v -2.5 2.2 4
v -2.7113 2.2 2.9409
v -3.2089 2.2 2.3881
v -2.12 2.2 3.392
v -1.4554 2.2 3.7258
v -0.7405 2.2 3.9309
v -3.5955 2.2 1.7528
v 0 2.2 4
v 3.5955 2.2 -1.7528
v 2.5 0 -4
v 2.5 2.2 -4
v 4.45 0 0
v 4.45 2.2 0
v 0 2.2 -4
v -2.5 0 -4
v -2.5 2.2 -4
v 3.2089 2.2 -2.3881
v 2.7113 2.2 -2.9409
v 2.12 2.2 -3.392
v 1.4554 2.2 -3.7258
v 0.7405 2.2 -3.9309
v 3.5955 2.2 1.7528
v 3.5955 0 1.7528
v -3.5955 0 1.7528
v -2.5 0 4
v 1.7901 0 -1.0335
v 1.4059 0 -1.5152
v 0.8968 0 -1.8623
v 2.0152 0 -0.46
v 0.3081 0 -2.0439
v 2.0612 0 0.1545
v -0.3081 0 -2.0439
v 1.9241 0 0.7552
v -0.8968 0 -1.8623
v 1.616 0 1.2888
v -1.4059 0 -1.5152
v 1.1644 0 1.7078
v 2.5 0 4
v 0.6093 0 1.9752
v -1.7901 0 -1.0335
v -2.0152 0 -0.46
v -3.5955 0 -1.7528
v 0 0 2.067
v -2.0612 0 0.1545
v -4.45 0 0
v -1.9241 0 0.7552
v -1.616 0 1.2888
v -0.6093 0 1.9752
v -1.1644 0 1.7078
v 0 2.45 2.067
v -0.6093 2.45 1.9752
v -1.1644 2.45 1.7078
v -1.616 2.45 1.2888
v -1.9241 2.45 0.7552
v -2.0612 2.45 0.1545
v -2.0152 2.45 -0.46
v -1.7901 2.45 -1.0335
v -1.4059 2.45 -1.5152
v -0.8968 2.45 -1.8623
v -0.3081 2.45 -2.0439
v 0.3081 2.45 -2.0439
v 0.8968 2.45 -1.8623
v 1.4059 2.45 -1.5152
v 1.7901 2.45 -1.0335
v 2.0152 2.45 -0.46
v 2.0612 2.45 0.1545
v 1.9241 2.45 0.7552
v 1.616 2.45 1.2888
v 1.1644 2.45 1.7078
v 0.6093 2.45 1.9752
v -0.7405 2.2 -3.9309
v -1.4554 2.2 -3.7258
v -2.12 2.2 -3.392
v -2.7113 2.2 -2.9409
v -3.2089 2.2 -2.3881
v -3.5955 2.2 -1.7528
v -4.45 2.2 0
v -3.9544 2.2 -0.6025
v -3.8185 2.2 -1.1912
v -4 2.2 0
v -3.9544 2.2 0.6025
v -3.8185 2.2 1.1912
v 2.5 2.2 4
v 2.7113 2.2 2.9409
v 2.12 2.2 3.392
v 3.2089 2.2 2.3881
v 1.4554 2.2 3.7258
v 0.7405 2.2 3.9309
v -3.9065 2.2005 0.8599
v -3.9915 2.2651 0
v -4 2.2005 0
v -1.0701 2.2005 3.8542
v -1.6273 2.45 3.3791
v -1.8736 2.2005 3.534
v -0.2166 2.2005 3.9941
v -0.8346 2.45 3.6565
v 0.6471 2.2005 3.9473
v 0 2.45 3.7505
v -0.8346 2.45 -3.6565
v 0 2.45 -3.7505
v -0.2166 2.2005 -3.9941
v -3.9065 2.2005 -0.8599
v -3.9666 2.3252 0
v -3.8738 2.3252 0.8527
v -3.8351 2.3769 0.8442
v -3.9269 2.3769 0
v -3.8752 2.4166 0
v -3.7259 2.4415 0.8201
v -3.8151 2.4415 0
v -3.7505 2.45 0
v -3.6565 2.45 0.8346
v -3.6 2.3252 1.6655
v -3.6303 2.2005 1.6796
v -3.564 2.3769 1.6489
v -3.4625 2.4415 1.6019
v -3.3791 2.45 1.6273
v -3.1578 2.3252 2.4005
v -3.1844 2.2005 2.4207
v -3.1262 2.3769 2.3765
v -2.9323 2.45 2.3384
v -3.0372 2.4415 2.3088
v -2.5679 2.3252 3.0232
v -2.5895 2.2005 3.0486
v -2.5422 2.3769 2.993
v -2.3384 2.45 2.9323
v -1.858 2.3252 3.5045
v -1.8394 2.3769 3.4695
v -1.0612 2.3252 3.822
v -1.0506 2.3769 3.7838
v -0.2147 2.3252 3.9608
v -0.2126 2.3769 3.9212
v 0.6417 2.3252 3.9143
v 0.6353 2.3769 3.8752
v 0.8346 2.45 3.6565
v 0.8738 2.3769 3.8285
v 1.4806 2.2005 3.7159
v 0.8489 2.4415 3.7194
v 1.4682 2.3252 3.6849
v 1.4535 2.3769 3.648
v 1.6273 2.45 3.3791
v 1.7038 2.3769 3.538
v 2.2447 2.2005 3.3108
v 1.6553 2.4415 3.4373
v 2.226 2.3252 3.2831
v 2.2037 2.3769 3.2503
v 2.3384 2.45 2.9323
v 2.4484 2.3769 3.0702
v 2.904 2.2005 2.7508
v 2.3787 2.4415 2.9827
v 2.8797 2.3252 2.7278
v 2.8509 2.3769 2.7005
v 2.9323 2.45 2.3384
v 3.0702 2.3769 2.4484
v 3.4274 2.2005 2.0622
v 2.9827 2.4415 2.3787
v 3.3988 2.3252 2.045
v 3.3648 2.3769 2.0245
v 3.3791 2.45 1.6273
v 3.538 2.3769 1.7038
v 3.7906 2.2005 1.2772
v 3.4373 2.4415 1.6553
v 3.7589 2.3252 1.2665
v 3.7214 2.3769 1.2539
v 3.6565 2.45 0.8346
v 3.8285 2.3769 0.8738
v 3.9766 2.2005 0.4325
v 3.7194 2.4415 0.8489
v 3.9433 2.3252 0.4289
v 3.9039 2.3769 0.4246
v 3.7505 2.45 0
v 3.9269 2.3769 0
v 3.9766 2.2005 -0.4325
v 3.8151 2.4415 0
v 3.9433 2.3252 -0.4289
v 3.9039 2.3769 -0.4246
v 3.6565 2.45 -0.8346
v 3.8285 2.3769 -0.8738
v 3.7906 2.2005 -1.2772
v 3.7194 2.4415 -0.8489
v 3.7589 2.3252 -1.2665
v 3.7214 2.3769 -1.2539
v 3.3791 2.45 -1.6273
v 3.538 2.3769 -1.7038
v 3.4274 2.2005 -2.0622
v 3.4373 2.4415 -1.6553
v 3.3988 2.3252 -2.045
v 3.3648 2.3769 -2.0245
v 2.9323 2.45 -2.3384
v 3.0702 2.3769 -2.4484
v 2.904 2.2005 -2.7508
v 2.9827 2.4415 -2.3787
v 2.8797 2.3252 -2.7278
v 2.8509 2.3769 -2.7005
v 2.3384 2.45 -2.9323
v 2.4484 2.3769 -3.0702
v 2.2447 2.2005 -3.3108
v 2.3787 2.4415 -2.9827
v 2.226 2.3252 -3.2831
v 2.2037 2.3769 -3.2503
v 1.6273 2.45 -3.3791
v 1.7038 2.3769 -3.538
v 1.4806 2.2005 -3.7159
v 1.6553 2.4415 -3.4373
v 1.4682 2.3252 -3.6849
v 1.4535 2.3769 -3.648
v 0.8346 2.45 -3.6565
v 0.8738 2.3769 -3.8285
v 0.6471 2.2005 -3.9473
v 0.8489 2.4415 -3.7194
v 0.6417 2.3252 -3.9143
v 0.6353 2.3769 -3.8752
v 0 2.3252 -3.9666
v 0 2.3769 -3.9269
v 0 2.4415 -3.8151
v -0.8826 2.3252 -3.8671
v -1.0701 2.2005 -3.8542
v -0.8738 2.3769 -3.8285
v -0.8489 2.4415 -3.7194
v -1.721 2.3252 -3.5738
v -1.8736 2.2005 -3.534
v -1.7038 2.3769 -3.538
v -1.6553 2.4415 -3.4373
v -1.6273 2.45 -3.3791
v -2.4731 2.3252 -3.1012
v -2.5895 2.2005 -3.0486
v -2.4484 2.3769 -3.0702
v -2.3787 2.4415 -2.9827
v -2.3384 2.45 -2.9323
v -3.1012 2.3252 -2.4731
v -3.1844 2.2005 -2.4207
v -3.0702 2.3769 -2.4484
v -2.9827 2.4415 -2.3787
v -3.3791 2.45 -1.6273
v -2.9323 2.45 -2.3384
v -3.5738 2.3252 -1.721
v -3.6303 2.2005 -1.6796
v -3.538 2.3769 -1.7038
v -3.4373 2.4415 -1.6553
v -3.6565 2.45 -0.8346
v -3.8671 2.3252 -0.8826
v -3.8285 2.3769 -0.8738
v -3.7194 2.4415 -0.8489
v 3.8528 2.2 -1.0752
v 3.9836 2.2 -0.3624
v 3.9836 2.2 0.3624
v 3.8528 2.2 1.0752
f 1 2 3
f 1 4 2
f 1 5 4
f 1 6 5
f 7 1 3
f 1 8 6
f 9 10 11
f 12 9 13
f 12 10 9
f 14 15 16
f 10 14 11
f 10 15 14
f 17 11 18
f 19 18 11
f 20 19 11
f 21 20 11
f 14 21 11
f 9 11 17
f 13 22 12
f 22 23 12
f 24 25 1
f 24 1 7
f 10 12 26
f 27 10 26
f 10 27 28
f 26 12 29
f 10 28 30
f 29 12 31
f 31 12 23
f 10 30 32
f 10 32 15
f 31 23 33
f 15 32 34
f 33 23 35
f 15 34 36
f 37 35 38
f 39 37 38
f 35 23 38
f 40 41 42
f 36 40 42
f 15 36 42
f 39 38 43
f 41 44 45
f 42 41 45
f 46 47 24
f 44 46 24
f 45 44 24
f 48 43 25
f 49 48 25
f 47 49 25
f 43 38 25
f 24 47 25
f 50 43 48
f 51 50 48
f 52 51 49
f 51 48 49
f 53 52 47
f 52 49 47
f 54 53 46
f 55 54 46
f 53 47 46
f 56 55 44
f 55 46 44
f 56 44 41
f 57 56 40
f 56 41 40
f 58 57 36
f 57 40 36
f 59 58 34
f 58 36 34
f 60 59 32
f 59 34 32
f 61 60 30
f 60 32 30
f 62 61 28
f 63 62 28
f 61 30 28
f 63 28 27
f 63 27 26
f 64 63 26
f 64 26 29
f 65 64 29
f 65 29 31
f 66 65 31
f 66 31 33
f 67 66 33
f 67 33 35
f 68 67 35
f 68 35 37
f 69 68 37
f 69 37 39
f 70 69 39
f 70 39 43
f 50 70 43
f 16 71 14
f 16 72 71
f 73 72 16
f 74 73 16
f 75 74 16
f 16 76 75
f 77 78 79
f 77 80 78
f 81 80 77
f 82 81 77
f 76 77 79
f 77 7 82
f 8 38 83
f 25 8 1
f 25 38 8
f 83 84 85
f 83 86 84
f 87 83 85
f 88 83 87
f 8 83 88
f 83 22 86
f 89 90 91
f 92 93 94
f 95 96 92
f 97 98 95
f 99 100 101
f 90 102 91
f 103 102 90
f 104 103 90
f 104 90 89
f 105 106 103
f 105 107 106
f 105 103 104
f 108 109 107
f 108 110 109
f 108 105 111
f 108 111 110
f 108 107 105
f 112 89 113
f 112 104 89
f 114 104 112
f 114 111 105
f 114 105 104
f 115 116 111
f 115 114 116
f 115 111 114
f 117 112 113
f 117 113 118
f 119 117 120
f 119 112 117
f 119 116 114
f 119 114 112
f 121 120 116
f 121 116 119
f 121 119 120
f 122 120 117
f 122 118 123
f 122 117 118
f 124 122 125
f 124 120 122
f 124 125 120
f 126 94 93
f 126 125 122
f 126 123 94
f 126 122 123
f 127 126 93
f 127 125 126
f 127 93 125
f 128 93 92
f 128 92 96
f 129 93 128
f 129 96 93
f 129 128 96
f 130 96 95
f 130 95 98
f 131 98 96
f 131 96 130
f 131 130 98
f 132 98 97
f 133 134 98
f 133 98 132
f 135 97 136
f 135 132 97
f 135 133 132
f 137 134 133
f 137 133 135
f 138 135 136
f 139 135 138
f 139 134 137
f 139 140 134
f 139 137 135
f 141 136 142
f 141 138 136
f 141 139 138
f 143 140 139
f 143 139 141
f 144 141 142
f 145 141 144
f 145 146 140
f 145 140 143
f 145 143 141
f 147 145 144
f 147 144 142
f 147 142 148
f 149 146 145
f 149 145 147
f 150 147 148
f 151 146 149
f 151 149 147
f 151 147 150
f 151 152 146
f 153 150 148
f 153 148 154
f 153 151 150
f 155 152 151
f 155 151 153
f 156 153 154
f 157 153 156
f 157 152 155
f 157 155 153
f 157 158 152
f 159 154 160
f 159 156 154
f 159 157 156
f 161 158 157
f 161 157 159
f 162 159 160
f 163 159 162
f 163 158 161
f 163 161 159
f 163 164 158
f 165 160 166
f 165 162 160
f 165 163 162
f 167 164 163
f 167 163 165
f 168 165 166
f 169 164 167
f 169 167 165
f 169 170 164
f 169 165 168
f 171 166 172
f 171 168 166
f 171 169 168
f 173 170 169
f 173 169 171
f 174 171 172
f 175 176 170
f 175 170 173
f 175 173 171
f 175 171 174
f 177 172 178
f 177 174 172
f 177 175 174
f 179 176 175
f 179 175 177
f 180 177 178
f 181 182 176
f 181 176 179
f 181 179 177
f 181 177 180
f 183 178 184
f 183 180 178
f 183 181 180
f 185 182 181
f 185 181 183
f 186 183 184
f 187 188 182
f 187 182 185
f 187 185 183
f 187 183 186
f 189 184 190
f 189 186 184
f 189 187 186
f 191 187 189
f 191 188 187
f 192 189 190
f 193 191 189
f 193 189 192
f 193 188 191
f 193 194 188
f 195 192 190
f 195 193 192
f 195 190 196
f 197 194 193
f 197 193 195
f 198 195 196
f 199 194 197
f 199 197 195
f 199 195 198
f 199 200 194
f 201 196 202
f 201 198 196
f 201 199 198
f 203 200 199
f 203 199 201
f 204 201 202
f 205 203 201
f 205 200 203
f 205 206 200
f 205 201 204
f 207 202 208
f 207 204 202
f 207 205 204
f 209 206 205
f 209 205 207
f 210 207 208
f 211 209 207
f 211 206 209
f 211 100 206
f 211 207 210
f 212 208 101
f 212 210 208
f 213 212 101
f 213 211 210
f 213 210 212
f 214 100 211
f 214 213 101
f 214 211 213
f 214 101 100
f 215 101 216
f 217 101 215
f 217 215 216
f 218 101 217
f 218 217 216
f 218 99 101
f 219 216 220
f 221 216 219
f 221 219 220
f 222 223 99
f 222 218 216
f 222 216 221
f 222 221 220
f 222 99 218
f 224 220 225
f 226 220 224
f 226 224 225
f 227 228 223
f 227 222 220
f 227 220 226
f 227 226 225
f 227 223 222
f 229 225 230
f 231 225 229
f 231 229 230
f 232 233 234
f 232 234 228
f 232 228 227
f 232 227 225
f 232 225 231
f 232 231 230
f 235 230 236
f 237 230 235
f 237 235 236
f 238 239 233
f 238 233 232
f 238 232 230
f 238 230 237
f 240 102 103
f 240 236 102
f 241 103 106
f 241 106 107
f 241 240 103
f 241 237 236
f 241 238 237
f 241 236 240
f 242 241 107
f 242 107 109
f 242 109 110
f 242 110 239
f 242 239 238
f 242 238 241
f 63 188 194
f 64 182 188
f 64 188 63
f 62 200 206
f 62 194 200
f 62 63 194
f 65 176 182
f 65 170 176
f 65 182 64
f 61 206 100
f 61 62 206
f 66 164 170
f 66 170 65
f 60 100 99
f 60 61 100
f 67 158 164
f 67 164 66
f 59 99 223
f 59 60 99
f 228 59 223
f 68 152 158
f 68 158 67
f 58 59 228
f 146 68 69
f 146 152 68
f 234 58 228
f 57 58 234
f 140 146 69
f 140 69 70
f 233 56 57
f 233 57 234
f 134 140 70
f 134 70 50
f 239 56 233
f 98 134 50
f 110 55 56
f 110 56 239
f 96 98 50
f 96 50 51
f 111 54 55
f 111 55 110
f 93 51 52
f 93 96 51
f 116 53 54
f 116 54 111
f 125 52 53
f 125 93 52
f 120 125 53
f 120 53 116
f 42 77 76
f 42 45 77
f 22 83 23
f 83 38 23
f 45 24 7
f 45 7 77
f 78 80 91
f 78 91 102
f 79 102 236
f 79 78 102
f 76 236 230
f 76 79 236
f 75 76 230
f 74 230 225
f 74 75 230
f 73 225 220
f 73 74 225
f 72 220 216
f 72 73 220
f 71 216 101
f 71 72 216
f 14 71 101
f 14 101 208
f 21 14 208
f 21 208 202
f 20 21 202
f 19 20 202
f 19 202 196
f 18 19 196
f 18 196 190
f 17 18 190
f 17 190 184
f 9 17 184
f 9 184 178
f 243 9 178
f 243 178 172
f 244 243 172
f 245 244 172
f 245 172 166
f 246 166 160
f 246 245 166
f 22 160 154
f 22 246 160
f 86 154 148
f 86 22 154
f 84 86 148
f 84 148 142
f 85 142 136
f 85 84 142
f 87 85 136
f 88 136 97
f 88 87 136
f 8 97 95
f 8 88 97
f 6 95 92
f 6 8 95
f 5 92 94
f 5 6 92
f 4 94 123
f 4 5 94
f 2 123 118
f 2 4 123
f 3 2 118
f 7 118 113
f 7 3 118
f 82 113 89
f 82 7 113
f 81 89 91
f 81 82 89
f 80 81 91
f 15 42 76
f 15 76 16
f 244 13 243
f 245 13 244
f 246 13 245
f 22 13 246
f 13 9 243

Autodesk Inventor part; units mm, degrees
ref_plane "YZ Plane" through (0, 0, 0) normal (1, 0, 0) x (0, 1, 0)
ref_plane "XZ Plane" through (0, 0, 0) normal (0, 1, 0) x (-1, 0, 0)
ref_plane "XY Plane" through (0, 0, 0) normal (0, 0, 1) x (1, 0, 0)
sketch "Szkic1" plane through (0, 0, 0) normal (0, 1, 0) x (-1, 0, 0)
  circle A0 centre (0, 0) radius 2.5
  line L0 (0, 0) -> (0, -4)
  line L1 (0, 0) -> (0, 4)
  circle A1 centre (0, 0) radius 4
  line L2 (5.4643, 0) -> (-5.9483, 0)
  line L3 (0, 4) -> (2.5, 4)
  line L4 (0, 4) -> (-2.5, 4)
  line L5 (2.5, 4) -> (3.5955, 1.7528)
  line L6 (3.5955, 1.7528) -> (4.45, 0)
  line L7 (4.45, 0) -> (3.5955, -1.7528)
  line L8 (3.5955, -1.7528) -> (2.5, -4)
  line L9 (2.5, -4) -> (0, -4)
  line L10 (0, -4) -> (-2.5, -4)
  line L11 (-2.5, 4) -> (-3.5955, 1.7528)
  line L12 (-3.5955, 1.7528) -> (-4.45, 0)
  line L13 (-2.5, -4) -> (-4.45, 0)
  point P0 (-3.5955, -1.7528)
  dimension "d0" = 5
  dimension "d1" = 4
  dimension "d2" = 4
  dimension "d3" = 8
  dimension "d4" = 2.5
  dimension "d5" = 2.5
extrude "Wyciągnięcie proste2" add sketch "Szkic1" along normal blind 2.2 contours L2 L7 A1 | A1 L6 L2 | L3 L5 A1 | A1 L11 L4 | L10 L13 A1 | A1 L8 L9 | L2 L12 A1 | A1 L13 L2
extrude "Wyciągnięcie proste3" add sketch "Szkic1" along normal blind 2.45 contours L2 L1 A0 | L2 A1 L0 A0 | A0 L1 A1 L2 | A0 L0 L2 | L1 L2 A0 | A0 L2 A1 L1 | L0 A1 L2 A0 | A0 L2 L0
sketch "Szkic2" plane through (0, 2.45, 0) normal (0, 1, 0) x (1, 0, 0)
  point P0 (0, 0)
  point P1 (0, 0)
hole "Otwór1" at (0, 2.45, 0) at (0, 2.45, 0) direction (0, -1, 0) diameter 4.134 depth 14.2 tip angle 118 thread size "M5x0.8" class "6H" standard "ANSI Metric M Profile"
fillet "Zaokrąglenie1" radius 0.25 1 edges at (4, 2.45, 0)
properties part number "nakretka"
